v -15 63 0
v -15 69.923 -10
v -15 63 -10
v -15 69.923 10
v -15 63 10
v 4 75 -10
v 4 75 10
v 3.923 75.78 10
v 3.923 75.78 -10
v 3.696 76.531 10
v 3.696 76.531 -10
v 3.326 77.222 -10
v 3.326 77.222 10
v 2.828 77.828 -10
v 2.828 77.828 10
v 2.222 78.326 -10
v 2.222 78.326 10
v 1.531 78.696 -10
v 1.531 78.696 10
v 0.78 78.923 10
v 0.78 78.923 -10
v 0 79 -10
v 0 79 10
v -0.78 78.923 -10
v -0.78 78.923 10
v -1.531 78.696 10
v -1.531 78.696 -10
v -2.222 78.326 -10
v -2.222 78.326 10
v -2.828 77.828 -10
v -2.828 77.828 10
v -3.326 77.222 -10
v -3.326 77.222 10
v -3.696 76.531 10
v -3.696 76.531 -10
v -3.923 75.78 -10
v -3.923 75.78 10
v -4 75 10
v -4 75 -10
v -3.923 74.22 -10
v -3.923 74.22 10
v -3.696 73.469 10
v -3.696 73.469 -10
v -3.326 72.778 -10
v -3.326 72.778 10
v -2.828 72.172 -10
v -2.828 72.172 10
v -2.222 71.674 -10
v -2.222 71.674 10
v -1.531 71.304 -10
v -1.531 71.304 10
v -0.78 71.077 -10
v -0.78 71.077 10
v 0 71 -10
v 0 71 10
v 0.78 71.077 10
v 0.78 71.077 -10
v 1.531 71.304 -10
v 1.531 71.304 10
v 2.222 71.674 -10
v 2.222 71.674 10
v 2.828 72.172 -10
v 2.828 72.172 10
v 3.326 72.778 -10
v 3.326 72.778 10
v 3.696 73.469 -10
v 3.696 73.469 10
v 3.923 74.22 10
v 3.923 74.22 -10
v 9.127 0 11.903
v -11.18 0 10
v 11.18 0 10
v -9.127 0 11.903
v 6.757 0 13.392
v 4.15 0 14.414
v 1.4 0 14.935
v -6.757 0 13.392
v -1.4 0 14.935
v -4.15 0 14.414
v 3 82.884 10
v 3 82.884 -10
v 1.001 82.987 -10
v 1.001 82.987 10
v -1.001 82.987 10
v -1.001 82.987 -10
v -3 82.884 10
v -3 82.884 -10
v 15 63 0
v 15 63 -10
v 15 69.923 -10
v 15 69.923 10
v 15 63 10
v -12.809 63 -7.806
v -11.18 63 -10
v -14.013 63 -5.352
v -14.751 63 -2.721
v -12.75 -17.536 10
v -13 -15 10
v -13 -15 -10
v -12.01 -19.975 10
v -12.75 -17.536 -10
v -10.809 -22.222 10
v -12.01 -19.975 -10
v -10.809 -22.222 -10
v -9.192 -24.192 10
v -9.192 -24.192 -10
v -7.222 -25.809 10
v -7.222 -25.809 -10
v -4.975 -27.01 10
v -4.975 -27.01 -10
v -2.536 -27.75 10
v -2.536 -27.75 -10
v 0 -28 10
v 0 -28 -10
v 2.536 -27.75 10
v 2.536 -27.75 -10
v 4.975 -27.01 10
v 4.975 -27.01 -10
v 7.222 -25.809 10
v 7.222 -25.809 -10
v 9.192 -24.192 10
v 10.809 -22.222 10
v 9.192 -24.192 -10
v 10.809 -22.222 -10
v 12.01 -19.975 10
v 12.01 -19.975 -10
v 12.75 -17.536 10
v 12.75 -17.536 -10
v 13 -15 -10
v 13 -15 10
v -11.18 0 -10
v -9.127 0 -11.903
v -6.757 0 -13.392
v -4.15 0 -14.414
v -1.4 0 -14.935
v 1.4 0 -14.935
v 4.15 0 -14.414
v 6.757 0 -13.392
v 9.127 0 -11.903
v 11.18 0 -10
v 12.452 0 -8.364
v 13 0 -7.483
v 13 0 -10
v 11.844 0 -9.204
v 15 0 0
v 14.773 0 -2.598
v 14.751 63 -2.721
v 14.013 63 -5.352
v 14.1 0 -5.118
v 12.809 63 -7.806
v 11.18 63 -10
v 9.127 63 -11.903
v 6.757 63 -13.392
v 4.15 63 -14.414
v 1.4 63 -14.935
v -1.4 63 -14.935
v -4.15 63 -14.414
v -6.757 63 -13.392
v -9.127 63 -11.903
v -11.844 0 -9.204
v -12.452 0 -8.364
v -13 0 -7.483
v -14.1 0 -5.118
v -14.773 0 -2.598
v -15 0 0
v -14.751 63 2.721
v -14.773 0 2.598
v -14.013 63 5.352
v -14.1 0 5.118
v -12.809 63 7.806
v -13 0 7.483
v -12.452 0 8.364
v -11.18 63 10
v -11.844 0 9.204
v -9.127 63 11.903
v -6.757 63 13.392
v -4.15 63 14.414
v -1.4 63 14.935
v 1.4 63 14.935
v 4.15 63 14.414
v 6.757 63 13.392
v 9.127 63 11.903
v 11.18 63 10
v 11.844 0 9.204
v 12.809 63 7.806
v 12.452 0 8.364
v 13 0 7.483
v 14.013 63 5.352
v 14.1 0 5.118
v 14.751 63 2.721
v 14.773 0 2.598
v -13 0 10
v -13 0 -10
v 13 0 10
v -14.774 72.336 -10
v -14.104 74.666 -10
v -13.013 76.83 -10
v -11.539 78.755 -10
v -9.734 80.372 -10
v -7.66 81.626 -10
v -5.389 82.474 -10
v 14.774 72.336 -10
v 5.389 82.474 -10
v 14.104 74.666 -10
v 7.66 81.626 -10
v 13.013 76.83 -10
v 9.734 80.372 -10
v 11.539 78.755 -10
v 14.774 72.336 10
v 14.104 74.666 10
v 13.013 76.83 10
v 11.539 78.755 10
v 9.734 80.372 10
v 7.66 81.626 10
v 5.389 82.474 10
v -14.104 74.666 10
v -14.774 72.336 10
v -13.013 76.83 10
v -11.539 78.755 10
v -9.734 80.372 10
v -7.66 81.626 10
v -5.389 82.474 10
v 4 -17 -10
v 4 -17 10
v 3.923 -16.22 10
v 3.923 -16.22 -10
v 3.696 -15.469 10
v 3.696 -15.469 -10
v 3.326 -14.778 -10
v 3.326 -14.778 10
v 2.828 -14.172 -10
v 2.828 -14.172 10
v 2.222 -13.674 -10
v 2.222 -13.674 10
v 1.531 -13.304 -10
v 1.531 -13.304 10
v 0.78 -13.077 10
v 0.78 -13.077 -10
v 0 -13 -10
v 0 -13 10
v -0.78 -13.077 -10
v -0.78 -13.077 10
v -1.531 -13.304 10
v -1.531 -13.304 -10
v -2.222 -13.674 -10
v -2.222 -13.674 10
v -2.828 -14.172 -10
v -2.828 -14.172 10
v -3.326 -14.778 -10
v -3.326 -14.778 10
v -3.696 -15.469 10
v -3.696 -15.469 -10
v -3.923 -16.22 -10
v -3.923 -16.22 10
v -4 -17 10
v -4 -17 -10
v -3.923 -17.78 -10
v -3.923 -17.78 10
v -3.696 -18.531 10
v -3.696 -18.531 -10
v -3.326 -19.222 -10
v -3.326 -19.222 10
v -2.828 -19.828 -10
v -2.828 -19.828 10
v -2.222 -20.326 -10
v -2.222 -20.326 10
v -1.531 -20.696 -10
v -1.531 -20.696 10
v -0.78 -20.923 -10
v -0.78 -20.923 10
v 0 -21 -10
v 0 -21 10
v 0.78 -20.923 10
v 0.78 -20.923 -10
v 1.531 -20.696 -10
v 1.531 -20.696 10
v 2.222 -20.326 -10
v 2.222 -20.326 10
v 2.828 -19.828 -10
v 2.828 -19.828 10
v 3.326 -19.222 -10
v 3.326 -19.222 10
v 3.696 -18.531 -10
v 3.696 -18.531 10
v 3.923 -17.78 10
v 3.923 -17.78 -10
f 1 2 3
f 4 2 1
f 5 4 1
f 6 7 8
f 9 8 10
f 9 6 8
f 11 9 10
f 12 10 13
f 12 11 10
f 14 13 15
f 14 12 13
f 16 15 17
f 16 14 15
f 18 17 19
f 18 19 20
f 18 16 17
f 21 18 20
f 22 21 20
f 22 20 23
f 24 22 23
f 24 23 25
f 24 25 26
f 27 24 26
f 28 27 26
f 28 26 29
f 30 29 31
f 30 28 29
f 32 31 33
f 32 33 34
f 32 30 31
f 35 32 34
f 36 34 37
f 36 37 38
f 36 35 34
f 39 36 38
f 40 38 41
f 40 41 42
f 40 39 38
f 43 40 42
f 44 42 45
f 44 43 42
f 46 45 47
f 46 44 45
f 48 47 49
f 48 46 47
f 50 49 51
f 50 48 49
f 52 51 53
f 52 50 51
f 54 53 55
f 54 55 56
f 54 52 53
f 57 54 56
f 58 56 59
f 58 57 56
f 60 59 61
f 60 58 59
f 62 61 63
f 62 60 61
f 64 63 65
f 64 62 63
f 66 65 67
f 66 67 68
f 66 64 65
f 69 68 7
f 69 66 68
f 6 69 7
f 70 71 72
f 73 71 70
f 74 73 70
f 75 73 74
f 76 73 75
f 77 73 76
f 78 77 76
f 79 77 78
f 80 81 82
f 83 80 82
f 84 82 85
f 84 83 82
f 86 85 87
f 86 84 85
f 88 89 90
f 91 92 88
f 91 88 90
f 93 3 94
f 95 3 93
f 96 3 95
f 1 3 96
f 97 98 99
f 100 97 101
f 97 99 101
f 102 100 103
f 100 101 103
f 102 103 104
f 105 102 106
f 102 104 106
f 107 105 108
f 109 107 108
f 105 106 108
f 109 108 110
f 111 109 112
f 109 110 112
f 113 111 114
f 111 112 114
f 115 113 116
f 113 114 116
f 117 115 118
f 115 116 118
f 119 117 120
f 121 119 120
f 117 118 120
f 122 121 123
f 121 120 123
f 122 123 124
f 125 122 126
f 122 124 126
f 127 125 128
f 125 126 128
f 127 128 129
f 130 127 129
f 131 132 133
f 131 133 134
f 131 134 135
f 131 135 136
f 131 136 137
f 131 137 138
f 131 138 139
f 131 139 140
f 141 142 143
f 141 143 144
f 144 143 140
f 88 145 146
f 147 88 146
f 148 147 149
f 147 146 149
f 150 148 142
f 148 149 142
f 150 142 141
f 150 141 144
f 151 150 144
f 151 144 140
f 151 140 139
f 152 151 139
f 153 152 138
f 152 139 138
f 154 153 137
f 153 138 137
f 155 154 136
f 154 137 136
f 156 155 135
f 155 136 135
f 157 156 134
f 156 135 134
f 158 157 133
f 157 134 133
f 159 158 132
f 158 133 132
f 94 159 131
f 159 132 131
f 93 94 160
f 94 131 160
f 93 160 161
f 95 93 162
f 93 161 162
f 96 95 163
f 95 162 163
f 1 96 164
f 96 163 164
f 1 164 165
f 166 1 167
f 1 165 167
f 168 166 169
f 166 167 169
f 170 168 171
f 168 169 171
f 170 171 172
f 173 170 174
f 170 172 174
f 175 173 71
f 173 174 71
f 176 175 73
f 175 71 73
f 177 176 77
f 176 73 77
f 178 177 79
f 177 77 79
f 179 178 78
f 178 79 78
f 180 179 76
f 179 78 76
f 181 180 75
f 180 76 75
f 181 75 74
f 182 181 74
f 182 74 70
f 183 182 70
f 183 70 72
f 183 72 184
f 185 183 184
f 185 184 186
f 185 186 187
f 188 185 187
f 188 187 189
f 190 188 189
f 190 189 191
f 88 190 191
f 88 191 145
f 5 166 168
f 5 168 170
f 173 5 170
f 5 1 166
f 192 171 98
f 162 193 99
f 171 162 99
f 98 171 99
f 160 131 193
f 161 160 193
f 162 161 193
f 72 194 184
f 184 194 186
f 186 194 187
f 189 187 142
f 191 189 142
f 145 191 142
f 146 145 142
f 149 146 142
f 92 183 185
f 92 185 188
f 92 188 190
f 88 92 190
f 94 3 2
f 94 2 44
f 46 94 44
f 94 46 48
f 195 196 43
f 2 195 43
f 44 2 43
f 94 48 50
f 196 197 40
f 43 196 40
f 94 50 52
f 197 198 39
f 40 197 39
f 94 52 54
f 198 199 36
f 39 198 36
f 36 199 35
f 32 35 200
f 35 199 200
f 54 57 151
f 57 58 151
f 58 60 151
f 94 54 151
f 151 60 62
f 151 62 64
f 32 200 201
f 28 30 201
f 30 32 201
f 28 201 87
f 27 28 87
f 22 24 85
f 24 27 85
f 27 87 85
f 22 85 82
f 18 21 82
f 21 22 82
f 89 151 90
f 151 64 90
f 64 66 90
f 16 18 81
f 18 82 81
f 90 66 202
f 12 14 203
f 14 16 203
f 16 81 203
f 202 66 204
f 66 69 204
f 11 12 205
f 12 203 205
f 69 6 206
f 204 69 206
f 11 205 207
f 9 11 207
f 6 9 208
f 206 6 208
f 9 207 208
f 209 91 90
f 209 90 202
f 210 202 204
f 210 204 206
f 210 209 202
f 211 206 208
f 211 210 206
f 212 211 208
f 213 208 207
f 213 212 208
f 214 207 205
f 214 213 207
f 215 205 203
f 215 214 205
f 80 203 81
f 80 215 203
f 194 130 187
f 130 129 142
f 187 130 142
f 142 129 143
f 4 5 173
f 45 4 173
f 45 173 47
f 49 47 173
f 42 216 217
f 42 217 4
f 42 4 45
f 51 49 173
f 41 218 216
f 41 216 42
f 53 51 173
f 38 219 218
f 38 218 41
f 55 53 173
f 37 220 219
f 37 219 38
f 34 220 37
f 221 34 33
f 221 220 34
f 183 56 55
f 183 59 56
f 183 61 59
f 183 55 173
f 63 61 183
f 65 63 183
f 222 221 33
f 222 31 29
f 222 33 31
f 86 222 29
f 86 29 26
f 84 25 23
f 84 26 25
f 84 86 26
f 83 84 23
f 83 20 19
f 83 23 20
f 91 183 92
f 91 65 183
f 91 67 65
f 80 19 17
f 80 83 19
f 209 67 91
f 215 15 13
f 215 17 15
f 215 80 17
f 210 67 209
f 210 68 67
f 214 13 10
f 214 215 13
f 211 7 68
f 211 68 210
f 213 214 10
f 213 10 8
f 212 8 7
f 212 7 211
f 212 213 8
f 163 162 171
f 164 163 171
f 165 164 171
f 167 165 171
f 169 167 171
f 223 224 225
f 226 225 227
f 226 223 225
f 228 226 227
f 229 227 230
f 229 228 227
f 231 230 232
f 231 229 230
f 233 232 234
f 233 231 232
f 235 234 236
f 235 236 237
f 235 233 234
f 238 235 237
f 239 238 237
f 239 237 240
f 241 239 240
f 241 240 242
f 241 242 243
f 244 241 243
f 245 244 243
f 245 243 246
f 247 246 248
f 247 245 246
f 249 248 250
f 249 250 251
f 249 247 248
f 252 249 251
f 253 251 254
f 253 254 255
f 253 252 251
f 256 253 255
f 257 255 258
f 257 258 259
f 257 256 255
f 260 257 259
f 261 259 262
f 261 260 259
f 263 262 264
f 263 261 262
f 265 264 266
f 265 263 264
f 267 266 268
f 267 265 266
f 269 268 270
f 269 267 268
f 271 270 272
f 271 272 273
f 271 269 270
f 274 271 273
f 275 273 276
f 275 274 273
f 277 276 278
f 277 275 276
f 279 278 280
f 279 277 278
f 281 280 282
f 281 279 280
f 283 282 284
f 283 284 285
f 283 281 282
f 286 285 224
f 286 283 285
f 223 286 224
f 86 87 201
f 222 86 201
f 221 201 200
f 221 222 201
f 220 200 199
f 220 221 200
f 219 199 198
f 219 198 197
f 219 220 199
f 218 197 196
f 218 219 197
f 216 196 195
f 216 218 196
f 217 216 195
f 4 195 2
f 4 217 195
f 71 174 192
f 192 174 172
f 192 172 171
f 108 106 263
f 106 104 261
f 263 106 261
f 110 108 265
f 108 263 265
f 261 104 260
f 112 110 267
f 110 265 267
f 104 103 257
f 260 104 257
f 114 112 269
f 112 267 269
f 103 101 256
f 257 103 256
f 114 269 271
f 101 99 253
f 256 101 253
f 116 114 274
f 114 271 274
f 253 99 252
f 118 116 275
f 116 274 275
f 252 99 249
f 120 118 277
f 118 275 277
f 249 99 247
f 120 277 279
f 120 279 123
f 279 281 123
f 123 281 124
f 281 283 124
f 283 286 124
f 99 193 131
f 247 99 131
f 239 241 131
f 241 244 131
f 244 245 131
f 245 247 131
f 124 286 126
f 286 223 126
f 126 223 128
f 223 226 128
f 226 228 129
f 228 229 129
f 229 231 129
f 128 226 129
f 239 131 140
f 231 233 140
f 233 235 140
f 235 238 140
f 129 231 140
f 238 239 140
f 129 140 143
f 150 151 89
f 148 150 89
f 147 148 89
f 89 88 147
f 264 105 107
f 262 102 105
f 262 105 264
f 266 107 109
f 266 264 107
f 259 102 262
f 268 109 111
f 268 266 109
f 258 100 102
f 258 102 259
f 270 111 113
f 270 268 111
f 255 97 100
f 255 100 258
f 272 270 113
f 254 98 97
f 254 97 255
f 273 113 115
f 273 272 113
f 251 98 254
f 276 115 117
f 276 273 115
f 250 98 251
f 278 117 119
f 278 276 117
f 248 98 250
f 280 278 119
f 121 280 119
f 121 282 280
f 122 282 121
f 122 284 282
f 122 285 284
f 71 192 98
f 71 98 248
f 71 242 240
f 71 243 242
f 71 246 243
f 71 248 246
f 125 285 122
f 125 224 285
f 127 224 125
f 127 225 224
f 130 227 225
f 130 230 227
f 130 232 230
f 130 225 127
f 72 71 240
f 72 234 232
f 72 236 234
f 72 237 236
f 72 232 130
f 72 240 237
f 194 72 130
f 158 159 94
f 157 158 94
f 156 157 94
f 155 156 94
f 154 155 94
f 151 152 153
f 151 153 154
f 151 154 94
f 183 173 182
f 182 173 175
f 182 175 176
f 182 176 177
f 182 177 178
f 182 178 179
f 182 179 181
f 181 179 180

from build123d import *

# Parameters (mm, degrees)
SKETCH1_R           = 15
BOSS_EXTRUDE1_DEPTH = 63
SKETCH3_R           = 4
BOSS_EXTRUDE2_DEPTH = 10


with BuildPart() as part:
    # Sketch1 → Boss-Extrude1 (new body)
    with BuildSketch(Plane(origin=(0, 0, 0), x_dir=(1, 0, 0), z_dir=(0, 1, 0))):
        Circle(SKETCH1_R)
    extrude(amount=BOSS_EXTRUDE1_DEPTH)

    # Sketch3 → Boss-Extrude2 (add, symmetric)
    with BuildSketch(Plane.XY):
        with BuildLine():
            Line((-13, 0), (-13, -15))
            ThreePointArc((-13, -15), (0, -28), (13, -15))
            Line((13, -15), (13, 0))
            Line((13, 0), (-13, 0))
        make_face()
        with Locations((0, -17)):
            Circle(SKETCH3_R, mode=Mode.SUBTRACT)
        with BuildLine():
            Line((-15, 63), (15, 63))
            Line((15, 63), (15, 69.922962794))
            ThreePointArc((15, 69.922962794), (11.539392014, 78.75472366), (3, 82.88444419))
            ThreePointArc((3, 82.88444419), (0, 83), (-3, 82.88444419))
            ThreePointArc((-3, 82.88444419), (-11.539392014, 78.75472366), (-15, 69.922962794))
            Line((-15, 69.922962794), (-15, 63))
        make_face()
        with Locations((0, 75)):
            Circle(SKETCH3_R, mode=Mode.SUBTRACT)
    extrude(amount=BOSS_EXTRUDE2_DEPTH, both=True)


solid = part.part
